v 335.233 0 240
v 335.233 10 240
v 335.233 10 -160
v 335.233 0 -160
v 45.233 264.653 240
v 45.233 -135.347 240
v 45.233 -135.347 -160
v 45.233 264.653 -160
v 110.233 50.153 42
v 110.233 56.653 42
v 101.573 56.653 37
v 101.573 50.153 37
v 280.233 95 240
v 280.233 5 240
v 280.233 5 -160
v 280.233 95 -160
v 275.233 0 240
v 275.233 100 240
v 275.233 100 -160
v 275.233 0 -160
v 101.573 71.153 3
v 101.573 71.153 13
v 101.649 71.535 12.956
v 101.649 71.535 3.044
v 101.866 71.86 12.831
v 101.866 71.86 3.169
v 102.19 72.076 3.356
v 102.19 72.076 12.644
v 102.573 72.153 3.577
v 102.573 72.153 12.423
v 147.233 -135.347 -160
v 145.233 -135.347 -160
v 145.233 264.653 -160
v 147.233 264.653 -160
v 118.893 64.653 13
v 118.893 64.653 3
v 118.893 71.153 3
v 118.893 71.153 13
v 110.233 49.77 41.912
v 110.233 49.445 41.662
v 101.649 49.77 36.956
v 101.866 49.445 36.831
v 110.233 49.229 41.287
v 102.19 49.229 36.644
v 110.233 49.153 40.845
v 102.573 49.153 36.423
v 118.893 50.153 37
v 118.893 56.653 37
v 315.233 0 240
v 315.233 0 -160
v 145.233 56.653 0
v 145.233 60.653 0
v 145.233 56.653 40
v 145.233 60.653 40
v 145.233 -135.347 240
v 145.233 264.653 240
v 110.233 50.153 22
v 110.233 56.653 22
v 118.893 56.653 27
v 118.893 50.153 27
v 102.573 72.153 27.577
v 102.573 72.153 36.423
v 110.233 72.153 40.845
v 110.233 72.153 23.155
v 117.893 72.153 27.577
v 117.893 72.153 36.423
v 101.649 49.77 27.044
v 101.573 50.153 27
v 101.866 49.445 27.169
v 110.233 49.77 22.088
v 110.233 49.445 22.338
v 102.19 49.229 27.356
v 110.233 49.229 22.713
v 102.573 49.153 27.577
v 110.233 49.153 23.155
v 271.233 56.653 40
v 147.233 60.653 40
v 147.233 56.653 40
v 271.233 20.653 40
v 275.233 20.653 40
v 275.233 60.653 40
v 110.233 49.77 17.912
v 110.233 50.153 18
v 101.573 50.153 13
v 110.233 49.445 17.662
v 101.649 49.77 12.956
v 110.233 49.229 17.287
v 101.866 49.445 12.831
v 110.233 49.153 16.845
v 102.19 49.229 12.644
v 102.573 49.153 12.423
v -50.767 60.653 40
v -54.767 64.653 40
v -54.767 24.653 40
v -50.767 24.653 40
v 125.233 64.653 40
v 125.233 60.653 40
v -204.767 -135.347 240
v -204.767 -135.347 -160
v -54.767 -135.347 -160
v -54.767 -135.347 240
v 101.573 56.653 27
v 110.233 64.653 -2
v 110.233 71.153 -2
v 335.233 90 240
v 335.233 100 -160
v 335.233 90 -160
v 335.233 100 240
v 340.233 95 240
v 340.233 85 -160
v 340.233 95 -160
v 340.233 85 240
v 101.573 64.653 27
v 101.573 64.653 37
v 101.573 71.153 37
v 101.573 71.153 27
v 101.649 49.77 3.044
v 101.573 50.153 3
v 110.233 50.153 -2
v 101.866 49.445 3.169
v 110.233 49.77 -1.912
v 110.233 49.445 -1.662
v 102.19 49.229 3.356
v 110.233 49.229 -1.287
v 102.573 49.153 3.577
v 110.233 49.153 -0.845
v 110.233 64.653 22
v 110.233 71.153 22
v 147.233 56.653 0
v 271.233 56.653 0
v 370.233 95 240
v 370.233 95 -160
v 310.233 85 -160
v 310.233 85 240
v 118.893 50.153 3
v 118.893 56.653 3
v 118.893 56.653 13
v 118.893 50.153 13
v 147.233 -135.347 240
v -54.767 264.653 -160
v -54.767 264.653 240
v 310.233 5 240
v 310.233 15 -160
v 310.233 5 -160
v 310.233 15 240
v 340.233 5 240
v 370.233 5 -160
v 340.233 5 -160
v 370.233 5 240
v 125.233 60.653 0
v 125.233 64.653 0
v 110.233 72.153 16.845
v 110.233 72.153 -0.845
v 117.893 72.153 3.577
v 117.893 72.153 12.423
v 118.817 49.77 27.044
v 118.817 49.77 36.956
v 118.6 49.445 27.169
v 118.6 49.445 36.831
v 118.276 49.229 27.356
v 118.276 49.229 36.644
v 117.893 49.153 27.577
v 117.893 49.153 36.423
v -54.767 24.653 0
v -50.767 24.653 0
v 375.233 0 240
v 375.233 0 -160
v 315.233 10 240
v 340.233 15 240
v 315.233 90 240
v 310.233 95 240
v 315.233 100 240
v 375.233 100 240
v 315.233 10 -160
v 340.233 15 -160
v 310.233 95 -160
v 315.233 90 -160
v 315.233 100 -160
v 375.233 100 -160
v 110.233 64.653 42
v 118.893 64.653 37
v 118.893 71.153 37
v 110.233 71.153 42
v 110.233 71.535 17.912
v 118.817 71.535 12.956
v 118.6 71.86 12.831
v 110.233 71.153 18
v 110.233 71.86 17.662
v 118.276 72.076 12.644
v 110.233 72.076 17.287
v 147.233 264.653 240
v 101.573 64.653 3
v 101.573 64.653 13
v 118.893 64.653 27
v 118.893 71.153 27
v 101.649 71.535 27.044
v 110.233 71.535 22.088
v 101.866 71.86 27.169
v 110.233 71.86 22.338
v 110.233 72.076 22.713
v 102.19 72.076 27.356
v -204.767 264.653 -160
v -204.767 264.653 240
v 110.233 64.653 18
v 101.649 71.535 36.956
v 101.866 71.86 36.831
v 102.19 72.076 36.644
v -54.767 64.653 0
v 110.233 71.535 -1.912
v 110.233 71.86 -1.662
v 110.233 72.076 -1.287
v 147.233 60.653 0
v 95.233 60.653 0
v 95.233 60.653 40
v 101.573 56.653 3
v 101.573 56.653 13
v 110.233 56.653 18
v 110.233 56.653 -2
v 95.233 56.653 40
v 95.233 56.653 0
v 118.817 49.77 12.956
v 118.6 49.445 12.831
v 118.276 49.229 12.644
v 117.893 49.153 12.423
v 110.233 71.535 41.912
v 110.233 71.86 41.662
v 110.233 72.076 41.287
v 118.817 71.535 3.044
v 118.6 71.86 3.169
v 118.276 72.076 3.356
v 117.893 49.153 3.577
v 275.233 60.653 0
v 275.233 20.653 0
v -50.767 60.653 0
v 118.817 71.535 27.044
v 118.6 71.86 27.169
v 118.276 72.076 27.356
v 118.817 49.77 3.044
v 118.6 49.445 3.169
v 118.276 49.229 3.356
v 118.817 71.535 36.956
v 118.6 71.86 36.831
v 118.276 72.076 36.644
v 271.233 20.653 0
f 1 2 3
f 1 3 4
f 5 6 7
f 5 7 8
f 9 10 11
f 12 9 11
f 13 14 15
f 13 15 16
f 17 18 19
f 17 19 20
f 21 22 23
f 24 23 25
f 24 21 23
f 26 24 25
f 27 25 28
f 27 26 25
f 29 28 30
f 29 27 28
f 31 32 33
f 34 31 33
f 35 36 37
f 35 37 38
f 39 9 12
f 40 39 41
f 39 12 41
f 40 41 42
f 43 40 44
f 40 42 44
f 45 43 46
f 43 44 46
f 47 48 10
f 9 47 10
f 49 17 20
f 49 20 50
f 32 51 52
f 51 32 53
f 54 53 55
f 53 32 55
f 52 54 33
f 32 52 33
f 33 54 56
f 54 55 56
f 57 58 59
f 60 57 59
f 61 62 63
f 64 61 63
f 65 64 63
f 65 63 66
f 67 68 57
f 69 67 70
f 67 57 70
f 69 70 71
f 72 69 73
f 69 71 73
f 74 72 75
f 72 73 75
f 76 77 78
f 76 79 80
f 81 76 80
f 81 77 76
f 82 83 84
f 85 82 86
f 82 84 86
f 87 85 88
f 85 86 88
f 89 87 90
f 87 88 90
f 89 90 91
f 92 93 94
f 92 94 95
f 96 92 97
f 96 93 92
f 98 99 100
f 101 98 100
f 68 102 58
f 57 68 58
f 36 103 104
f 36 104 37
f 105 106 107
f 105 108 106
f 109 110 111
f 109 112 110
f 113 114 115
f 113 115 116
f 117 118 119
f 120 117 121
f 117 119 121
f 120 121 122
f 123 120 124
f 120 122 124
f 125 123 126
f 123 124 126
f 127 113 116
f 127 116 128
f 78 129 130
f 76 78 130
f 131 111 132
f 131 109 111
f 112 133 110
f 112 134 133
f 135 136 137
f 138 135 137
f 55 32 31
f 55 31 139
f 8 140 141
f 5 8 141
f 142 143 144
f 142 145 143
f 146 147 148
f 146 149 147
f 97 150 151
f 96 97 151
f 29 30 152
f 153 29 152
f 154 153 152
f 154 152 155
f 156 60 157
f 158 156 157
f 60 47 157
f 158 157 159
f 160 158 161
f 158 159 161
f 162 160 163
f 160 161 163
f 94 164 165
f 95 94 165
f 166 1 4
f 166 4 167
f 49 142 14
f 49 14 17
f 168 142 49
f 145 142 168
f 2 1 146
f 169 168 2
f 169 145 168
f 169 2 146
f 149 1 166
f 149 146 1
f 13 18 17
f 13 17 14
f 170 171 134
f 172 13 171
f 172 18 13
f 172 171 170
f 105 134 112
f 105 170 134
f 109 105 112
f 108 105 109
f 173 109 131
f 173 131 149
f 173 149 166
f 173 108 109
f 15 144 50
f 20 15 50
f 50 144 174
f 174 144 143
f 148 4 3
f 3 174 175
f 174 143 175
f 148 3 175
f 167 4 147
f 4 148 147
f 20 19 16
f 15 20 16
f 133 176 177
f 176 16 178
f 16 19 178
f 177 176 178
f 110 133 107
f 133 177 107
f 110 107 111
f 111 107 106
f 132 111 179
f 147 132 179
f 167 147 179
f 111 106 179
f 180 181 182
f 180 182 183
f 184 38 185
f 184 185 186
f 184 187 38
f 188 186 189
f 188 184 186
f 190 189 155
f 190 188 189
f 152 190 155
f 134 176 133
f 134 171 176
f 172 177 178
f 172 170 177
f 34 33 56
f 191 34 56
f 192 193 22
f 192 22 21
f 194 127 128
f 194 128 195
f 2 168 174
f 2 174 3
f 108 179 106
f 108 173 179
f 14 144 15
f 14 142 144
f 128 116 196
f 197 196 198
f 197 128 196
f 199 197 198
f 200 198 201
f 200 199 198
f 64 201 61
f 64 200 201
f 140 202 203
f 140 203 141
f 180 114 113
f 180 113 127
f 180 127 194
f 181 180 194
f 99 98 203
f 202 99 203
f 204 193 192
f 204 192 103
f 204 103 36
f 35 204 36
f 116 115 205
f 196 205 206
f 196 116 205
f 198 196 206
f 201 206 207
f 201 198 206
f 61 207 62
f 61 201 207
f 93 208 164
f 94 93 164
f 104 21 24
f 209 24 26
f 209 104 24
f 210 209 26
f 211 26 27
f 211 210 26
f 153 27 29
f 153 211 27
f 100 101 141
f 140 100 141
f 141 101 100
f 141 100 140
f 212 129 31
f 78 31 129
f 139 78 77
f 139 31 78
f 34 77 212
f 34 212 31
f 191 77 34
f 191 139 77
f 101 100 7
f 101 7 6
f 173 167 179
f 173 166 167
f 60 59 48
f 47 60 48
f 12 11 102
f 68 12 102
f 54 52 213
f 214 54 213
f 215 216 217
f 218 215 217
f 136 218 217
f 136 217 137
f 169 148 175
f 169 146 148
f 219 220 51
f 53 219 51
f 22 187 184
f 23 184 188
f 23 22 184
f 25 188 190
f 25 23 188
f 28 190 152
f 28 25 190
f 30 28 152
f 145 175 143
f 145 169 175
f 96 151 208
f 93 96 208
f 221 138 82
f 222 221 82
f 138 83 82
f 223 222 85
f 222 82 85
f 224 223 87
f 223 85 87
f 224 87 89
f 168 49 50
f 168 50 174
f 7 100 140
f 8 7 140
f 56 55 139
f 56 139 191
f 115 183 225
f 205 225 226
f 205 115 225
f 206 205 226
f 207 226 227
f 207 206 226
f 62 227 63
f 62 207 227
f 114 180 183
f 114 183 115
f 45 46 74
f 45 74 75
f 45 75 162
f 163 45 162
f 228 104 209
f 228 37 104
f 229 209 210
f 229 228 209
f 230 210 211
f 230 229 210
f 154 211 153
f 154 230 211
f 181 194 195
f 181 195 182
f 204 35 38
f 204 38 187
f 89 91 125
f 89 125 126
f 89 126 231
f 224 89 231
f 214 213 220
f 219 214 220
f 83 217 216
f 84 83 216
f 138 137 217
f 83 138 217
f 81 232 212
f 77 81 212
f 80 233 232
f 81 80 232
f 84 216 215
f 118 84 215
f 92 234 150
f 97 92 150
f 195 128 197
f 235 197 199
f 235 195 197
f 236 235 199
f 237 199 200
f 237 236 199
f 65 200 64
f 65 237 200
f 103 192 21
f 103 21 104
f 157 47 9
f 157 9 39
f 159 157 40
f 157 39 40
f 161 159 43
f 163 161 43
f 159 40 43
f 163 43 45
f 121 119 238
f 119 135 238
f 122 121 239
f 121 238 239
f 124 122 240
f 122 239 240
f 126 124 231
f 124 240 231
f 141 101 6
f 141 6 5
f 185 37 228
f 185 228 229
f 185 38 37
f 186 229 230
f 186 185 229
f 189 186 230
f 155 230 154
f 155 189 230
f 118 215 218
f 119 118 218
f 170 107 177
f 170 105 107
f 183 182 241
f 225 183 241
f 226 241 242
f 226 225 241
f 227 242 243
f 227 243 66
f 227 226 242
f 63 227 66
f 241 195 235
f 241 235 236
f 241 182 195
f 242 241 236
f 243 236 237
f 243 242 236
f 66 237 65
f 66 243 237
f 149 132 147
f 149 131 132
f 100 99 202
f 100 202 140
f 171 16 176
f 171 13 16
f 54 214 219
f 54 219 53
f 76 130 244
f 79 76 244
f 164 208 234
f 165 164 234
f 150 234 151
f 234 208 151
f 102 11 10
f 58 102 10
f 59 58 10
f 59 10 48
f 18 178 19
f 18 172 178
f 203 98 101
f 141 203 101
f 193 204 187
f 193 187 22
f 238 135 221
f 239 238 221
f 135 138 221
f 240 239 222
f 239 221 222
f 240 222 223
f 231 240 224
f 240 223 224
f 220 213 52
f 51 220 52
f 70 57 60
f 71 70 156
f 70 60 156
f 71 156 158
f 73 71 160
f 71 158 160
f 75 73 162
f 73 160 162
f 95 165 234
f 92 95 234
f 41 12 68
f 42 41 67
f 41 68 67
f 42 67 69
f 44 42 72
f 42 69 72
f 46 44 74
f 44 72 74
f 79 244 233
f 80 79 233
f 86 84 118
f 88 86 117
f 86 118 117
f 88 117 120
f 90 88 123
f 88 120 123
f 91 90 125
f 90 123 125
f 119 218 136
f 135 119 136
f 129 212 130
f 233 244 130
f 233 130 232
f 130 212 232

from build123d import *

# Parameters (mm, degrees)
F1_DEPTH       = 40
F3_DEPTH       = 40
F5_DEPTH       = 7.5
F6_R           = 1
F6_2_R         = 1
F9_DEPTH       = 200
F9_DEPTH_BACK  = 200
F10_W          = 150
F10_H          = 400
F11_DEPTH      = 200
F11_DEPTH_BACK = 200
F12_W          = 400
F12_H          = 400
F13_DEPTH      = 100
F16_W          = 400
F16_H          = 400
F17_DEPTH      = 2


with BuildPart() as f1:
    # F0 (on Top) → F1 (new body)
    with BuildSketch(Plane.XY):
        Polygon((125.2330060303, 64.6525276452), (-54.7669939697, 64.6525276452), (-54.7669939697, 24.6525276452), (-50.7669939697, 24.6525276452), (-50.7669939697, 60.6525276452), (125.2330060303, 60.6525276452), align=None)
    extrude(amount=F1_DEPTH)


with BuildPart() as f3:
    # F2 (on Top) → F3 (new body)
    with BuildSketch(Plane.XY):
        Polygon((275.2330060303, 60.6525276452), (95.2330060303, 60.6525276452), (95.2330060303, 56.6525276452), (271.2330060303, 56.6525276452), (271.2330060303, 20.6525276452), (275.2330060303, 20.6525276452), align=None)
    extrude(amount=F3_DEPTH)

    # F16 (on offset) → F17 (join)
    with BuildSketch(Plane.YZ.offset(145.2330060303)):
        with Locations((64.6525276452, 40)):
            Rectangle(F16_W, F16_H)
    extrude(amount=F17_DEPTH)


with BuildPart() as f5:
    # F4 (on face) → F5 (new body)
    with BuildSketch(Plane.XZ.offset(-56.6525276452)):
        Polygon((118.8932600682, 27), (118.8932600682, 37), (110.2330060303, 42), (101.5727519925, 37), (101.5727519925, 27), (110.2330060303, 22), align=None)
    extrude(amount=F5_DEPTH)

    # F6
    f6_edges = [f5.edges().sort_by_distance(p)[0] for p in [
        (105.902879, 49.152528, 39.5),
        (101.572752, 49.152528, 32),
        (105.902879, 49.152528, 24.5),
        (114.563133, 49.152528, 24.5),
        (118.89326, 49.152528, 32),
        (114.563133, 49.152528, 39.5),
    ]]
    fillet(f6_edges, radius=F6_R)


with BuildPart() as f5b:
    # F4 (on face) → F5, piece 2 (new body)
    with BuildSketch(Plane.XZ.offset(-56.6525276452)):
        Polygon((101.5727519925, 13), (101.5727519925, 3), (110.2330060303, -2), (118.8932600682, 3), (118.8932600682, 13), (110.2330060303, 18), align=None)
    extrude(amount=F5_DEPTH)

    # F6#2
    f6_2_edges = [f5b.edges().sort_by_distance(p)[0] for p in [
        (105.902879, 49.152528, 15.5),
        (101.572752, 49.152528, 8),
        (114.563133, 49.152528, 15.5),
        (118.89326, 49.152528, 8),
        (114.563133, 49.152528, 0.5),
        (105.902879, 49.152528, 0.5),
    ]]
    fillet(f6_2_edges, radius=F6_2_R)


with BuildPart() as f7_1:
    # F7: instance of F5
    add(f5.part.mirror(Plane(origin=(185.2330060303, 60.6525276452, 20), x_dir=(-1, 0, 0), z_dir=(0, 1, 0))))


with BuildPart() as f7_2:
    # F7: instance of F5b
    add(f5b.part.mirror(Plane(origin=(185.2330060303, 60.6525276452, 20), x_dir=(-1, 0, 0), z_dir=(0, 1, 0))))


with BuildPart() as f9:
    # F8 (on face) → F9 (new body, two sides)
    with BuildSketch(Plane.XY.offset(40)) as f9_sk:
        Polygon((315.2330060303, 100), (275.2330060303, 100), (275.2330060303, 0), (315.2330060303, 0), (315.2330060303, 10), (335.2330060303, 10), (335.2330060303, 0), (375.2330060303, 0), (375.2330060303, 100), (335.2330060303, 100), (335.2330060303, 90), (315.2330060303, 90), align=None)
        Polygon((280.2330060303, 5), (280.2330060303, 95), (310.2330060303, 95), (310.2330060303, 85), (340.2330060303, 85), (340.2330060303, 95), (370.2330060303, 95), (370.2330060303, 5), (340.2330060303, 5), (340.2330060303, 15), (310.2330060303, 15), (310.2330060303, 5), align=None, mode=Mode.SUBTRACT)
    extrude(amount=F9_DEPTH)
    extrude(f9_sk.sketch, amount=-F9_DEPTH_BACK)


with BuildPart() as f11:
    # F10 (on face) → F11 (new body, two sides)
    with BuildSketch(Plane.XY.offset(40)) as f11_sk:
        with Locations((-129.7669939697, 64.6525276452)):
            Rectangle(F10_W, F10_H)
    extrude(amount=F11_DEPTH)
    extrude(f11_sk.sketch, amount=-F11_DEPTH_BACK)


with BuildPart() as f13:
    # F12 (on face) → F13 (new body)
    with BuildSketch(Plane.YZ.offset(-54.7669939697)):
        with Locations((64.6525276452, 40)):
            Rectangle(F12_W, F12_H)
    extrude(amount=F13_DEPTH)


solid = Compound([f1.part, f3.part, f5.part, f5b.part, f7_1.part, f7_2.part, f9.part, f11.part, f13.part])
